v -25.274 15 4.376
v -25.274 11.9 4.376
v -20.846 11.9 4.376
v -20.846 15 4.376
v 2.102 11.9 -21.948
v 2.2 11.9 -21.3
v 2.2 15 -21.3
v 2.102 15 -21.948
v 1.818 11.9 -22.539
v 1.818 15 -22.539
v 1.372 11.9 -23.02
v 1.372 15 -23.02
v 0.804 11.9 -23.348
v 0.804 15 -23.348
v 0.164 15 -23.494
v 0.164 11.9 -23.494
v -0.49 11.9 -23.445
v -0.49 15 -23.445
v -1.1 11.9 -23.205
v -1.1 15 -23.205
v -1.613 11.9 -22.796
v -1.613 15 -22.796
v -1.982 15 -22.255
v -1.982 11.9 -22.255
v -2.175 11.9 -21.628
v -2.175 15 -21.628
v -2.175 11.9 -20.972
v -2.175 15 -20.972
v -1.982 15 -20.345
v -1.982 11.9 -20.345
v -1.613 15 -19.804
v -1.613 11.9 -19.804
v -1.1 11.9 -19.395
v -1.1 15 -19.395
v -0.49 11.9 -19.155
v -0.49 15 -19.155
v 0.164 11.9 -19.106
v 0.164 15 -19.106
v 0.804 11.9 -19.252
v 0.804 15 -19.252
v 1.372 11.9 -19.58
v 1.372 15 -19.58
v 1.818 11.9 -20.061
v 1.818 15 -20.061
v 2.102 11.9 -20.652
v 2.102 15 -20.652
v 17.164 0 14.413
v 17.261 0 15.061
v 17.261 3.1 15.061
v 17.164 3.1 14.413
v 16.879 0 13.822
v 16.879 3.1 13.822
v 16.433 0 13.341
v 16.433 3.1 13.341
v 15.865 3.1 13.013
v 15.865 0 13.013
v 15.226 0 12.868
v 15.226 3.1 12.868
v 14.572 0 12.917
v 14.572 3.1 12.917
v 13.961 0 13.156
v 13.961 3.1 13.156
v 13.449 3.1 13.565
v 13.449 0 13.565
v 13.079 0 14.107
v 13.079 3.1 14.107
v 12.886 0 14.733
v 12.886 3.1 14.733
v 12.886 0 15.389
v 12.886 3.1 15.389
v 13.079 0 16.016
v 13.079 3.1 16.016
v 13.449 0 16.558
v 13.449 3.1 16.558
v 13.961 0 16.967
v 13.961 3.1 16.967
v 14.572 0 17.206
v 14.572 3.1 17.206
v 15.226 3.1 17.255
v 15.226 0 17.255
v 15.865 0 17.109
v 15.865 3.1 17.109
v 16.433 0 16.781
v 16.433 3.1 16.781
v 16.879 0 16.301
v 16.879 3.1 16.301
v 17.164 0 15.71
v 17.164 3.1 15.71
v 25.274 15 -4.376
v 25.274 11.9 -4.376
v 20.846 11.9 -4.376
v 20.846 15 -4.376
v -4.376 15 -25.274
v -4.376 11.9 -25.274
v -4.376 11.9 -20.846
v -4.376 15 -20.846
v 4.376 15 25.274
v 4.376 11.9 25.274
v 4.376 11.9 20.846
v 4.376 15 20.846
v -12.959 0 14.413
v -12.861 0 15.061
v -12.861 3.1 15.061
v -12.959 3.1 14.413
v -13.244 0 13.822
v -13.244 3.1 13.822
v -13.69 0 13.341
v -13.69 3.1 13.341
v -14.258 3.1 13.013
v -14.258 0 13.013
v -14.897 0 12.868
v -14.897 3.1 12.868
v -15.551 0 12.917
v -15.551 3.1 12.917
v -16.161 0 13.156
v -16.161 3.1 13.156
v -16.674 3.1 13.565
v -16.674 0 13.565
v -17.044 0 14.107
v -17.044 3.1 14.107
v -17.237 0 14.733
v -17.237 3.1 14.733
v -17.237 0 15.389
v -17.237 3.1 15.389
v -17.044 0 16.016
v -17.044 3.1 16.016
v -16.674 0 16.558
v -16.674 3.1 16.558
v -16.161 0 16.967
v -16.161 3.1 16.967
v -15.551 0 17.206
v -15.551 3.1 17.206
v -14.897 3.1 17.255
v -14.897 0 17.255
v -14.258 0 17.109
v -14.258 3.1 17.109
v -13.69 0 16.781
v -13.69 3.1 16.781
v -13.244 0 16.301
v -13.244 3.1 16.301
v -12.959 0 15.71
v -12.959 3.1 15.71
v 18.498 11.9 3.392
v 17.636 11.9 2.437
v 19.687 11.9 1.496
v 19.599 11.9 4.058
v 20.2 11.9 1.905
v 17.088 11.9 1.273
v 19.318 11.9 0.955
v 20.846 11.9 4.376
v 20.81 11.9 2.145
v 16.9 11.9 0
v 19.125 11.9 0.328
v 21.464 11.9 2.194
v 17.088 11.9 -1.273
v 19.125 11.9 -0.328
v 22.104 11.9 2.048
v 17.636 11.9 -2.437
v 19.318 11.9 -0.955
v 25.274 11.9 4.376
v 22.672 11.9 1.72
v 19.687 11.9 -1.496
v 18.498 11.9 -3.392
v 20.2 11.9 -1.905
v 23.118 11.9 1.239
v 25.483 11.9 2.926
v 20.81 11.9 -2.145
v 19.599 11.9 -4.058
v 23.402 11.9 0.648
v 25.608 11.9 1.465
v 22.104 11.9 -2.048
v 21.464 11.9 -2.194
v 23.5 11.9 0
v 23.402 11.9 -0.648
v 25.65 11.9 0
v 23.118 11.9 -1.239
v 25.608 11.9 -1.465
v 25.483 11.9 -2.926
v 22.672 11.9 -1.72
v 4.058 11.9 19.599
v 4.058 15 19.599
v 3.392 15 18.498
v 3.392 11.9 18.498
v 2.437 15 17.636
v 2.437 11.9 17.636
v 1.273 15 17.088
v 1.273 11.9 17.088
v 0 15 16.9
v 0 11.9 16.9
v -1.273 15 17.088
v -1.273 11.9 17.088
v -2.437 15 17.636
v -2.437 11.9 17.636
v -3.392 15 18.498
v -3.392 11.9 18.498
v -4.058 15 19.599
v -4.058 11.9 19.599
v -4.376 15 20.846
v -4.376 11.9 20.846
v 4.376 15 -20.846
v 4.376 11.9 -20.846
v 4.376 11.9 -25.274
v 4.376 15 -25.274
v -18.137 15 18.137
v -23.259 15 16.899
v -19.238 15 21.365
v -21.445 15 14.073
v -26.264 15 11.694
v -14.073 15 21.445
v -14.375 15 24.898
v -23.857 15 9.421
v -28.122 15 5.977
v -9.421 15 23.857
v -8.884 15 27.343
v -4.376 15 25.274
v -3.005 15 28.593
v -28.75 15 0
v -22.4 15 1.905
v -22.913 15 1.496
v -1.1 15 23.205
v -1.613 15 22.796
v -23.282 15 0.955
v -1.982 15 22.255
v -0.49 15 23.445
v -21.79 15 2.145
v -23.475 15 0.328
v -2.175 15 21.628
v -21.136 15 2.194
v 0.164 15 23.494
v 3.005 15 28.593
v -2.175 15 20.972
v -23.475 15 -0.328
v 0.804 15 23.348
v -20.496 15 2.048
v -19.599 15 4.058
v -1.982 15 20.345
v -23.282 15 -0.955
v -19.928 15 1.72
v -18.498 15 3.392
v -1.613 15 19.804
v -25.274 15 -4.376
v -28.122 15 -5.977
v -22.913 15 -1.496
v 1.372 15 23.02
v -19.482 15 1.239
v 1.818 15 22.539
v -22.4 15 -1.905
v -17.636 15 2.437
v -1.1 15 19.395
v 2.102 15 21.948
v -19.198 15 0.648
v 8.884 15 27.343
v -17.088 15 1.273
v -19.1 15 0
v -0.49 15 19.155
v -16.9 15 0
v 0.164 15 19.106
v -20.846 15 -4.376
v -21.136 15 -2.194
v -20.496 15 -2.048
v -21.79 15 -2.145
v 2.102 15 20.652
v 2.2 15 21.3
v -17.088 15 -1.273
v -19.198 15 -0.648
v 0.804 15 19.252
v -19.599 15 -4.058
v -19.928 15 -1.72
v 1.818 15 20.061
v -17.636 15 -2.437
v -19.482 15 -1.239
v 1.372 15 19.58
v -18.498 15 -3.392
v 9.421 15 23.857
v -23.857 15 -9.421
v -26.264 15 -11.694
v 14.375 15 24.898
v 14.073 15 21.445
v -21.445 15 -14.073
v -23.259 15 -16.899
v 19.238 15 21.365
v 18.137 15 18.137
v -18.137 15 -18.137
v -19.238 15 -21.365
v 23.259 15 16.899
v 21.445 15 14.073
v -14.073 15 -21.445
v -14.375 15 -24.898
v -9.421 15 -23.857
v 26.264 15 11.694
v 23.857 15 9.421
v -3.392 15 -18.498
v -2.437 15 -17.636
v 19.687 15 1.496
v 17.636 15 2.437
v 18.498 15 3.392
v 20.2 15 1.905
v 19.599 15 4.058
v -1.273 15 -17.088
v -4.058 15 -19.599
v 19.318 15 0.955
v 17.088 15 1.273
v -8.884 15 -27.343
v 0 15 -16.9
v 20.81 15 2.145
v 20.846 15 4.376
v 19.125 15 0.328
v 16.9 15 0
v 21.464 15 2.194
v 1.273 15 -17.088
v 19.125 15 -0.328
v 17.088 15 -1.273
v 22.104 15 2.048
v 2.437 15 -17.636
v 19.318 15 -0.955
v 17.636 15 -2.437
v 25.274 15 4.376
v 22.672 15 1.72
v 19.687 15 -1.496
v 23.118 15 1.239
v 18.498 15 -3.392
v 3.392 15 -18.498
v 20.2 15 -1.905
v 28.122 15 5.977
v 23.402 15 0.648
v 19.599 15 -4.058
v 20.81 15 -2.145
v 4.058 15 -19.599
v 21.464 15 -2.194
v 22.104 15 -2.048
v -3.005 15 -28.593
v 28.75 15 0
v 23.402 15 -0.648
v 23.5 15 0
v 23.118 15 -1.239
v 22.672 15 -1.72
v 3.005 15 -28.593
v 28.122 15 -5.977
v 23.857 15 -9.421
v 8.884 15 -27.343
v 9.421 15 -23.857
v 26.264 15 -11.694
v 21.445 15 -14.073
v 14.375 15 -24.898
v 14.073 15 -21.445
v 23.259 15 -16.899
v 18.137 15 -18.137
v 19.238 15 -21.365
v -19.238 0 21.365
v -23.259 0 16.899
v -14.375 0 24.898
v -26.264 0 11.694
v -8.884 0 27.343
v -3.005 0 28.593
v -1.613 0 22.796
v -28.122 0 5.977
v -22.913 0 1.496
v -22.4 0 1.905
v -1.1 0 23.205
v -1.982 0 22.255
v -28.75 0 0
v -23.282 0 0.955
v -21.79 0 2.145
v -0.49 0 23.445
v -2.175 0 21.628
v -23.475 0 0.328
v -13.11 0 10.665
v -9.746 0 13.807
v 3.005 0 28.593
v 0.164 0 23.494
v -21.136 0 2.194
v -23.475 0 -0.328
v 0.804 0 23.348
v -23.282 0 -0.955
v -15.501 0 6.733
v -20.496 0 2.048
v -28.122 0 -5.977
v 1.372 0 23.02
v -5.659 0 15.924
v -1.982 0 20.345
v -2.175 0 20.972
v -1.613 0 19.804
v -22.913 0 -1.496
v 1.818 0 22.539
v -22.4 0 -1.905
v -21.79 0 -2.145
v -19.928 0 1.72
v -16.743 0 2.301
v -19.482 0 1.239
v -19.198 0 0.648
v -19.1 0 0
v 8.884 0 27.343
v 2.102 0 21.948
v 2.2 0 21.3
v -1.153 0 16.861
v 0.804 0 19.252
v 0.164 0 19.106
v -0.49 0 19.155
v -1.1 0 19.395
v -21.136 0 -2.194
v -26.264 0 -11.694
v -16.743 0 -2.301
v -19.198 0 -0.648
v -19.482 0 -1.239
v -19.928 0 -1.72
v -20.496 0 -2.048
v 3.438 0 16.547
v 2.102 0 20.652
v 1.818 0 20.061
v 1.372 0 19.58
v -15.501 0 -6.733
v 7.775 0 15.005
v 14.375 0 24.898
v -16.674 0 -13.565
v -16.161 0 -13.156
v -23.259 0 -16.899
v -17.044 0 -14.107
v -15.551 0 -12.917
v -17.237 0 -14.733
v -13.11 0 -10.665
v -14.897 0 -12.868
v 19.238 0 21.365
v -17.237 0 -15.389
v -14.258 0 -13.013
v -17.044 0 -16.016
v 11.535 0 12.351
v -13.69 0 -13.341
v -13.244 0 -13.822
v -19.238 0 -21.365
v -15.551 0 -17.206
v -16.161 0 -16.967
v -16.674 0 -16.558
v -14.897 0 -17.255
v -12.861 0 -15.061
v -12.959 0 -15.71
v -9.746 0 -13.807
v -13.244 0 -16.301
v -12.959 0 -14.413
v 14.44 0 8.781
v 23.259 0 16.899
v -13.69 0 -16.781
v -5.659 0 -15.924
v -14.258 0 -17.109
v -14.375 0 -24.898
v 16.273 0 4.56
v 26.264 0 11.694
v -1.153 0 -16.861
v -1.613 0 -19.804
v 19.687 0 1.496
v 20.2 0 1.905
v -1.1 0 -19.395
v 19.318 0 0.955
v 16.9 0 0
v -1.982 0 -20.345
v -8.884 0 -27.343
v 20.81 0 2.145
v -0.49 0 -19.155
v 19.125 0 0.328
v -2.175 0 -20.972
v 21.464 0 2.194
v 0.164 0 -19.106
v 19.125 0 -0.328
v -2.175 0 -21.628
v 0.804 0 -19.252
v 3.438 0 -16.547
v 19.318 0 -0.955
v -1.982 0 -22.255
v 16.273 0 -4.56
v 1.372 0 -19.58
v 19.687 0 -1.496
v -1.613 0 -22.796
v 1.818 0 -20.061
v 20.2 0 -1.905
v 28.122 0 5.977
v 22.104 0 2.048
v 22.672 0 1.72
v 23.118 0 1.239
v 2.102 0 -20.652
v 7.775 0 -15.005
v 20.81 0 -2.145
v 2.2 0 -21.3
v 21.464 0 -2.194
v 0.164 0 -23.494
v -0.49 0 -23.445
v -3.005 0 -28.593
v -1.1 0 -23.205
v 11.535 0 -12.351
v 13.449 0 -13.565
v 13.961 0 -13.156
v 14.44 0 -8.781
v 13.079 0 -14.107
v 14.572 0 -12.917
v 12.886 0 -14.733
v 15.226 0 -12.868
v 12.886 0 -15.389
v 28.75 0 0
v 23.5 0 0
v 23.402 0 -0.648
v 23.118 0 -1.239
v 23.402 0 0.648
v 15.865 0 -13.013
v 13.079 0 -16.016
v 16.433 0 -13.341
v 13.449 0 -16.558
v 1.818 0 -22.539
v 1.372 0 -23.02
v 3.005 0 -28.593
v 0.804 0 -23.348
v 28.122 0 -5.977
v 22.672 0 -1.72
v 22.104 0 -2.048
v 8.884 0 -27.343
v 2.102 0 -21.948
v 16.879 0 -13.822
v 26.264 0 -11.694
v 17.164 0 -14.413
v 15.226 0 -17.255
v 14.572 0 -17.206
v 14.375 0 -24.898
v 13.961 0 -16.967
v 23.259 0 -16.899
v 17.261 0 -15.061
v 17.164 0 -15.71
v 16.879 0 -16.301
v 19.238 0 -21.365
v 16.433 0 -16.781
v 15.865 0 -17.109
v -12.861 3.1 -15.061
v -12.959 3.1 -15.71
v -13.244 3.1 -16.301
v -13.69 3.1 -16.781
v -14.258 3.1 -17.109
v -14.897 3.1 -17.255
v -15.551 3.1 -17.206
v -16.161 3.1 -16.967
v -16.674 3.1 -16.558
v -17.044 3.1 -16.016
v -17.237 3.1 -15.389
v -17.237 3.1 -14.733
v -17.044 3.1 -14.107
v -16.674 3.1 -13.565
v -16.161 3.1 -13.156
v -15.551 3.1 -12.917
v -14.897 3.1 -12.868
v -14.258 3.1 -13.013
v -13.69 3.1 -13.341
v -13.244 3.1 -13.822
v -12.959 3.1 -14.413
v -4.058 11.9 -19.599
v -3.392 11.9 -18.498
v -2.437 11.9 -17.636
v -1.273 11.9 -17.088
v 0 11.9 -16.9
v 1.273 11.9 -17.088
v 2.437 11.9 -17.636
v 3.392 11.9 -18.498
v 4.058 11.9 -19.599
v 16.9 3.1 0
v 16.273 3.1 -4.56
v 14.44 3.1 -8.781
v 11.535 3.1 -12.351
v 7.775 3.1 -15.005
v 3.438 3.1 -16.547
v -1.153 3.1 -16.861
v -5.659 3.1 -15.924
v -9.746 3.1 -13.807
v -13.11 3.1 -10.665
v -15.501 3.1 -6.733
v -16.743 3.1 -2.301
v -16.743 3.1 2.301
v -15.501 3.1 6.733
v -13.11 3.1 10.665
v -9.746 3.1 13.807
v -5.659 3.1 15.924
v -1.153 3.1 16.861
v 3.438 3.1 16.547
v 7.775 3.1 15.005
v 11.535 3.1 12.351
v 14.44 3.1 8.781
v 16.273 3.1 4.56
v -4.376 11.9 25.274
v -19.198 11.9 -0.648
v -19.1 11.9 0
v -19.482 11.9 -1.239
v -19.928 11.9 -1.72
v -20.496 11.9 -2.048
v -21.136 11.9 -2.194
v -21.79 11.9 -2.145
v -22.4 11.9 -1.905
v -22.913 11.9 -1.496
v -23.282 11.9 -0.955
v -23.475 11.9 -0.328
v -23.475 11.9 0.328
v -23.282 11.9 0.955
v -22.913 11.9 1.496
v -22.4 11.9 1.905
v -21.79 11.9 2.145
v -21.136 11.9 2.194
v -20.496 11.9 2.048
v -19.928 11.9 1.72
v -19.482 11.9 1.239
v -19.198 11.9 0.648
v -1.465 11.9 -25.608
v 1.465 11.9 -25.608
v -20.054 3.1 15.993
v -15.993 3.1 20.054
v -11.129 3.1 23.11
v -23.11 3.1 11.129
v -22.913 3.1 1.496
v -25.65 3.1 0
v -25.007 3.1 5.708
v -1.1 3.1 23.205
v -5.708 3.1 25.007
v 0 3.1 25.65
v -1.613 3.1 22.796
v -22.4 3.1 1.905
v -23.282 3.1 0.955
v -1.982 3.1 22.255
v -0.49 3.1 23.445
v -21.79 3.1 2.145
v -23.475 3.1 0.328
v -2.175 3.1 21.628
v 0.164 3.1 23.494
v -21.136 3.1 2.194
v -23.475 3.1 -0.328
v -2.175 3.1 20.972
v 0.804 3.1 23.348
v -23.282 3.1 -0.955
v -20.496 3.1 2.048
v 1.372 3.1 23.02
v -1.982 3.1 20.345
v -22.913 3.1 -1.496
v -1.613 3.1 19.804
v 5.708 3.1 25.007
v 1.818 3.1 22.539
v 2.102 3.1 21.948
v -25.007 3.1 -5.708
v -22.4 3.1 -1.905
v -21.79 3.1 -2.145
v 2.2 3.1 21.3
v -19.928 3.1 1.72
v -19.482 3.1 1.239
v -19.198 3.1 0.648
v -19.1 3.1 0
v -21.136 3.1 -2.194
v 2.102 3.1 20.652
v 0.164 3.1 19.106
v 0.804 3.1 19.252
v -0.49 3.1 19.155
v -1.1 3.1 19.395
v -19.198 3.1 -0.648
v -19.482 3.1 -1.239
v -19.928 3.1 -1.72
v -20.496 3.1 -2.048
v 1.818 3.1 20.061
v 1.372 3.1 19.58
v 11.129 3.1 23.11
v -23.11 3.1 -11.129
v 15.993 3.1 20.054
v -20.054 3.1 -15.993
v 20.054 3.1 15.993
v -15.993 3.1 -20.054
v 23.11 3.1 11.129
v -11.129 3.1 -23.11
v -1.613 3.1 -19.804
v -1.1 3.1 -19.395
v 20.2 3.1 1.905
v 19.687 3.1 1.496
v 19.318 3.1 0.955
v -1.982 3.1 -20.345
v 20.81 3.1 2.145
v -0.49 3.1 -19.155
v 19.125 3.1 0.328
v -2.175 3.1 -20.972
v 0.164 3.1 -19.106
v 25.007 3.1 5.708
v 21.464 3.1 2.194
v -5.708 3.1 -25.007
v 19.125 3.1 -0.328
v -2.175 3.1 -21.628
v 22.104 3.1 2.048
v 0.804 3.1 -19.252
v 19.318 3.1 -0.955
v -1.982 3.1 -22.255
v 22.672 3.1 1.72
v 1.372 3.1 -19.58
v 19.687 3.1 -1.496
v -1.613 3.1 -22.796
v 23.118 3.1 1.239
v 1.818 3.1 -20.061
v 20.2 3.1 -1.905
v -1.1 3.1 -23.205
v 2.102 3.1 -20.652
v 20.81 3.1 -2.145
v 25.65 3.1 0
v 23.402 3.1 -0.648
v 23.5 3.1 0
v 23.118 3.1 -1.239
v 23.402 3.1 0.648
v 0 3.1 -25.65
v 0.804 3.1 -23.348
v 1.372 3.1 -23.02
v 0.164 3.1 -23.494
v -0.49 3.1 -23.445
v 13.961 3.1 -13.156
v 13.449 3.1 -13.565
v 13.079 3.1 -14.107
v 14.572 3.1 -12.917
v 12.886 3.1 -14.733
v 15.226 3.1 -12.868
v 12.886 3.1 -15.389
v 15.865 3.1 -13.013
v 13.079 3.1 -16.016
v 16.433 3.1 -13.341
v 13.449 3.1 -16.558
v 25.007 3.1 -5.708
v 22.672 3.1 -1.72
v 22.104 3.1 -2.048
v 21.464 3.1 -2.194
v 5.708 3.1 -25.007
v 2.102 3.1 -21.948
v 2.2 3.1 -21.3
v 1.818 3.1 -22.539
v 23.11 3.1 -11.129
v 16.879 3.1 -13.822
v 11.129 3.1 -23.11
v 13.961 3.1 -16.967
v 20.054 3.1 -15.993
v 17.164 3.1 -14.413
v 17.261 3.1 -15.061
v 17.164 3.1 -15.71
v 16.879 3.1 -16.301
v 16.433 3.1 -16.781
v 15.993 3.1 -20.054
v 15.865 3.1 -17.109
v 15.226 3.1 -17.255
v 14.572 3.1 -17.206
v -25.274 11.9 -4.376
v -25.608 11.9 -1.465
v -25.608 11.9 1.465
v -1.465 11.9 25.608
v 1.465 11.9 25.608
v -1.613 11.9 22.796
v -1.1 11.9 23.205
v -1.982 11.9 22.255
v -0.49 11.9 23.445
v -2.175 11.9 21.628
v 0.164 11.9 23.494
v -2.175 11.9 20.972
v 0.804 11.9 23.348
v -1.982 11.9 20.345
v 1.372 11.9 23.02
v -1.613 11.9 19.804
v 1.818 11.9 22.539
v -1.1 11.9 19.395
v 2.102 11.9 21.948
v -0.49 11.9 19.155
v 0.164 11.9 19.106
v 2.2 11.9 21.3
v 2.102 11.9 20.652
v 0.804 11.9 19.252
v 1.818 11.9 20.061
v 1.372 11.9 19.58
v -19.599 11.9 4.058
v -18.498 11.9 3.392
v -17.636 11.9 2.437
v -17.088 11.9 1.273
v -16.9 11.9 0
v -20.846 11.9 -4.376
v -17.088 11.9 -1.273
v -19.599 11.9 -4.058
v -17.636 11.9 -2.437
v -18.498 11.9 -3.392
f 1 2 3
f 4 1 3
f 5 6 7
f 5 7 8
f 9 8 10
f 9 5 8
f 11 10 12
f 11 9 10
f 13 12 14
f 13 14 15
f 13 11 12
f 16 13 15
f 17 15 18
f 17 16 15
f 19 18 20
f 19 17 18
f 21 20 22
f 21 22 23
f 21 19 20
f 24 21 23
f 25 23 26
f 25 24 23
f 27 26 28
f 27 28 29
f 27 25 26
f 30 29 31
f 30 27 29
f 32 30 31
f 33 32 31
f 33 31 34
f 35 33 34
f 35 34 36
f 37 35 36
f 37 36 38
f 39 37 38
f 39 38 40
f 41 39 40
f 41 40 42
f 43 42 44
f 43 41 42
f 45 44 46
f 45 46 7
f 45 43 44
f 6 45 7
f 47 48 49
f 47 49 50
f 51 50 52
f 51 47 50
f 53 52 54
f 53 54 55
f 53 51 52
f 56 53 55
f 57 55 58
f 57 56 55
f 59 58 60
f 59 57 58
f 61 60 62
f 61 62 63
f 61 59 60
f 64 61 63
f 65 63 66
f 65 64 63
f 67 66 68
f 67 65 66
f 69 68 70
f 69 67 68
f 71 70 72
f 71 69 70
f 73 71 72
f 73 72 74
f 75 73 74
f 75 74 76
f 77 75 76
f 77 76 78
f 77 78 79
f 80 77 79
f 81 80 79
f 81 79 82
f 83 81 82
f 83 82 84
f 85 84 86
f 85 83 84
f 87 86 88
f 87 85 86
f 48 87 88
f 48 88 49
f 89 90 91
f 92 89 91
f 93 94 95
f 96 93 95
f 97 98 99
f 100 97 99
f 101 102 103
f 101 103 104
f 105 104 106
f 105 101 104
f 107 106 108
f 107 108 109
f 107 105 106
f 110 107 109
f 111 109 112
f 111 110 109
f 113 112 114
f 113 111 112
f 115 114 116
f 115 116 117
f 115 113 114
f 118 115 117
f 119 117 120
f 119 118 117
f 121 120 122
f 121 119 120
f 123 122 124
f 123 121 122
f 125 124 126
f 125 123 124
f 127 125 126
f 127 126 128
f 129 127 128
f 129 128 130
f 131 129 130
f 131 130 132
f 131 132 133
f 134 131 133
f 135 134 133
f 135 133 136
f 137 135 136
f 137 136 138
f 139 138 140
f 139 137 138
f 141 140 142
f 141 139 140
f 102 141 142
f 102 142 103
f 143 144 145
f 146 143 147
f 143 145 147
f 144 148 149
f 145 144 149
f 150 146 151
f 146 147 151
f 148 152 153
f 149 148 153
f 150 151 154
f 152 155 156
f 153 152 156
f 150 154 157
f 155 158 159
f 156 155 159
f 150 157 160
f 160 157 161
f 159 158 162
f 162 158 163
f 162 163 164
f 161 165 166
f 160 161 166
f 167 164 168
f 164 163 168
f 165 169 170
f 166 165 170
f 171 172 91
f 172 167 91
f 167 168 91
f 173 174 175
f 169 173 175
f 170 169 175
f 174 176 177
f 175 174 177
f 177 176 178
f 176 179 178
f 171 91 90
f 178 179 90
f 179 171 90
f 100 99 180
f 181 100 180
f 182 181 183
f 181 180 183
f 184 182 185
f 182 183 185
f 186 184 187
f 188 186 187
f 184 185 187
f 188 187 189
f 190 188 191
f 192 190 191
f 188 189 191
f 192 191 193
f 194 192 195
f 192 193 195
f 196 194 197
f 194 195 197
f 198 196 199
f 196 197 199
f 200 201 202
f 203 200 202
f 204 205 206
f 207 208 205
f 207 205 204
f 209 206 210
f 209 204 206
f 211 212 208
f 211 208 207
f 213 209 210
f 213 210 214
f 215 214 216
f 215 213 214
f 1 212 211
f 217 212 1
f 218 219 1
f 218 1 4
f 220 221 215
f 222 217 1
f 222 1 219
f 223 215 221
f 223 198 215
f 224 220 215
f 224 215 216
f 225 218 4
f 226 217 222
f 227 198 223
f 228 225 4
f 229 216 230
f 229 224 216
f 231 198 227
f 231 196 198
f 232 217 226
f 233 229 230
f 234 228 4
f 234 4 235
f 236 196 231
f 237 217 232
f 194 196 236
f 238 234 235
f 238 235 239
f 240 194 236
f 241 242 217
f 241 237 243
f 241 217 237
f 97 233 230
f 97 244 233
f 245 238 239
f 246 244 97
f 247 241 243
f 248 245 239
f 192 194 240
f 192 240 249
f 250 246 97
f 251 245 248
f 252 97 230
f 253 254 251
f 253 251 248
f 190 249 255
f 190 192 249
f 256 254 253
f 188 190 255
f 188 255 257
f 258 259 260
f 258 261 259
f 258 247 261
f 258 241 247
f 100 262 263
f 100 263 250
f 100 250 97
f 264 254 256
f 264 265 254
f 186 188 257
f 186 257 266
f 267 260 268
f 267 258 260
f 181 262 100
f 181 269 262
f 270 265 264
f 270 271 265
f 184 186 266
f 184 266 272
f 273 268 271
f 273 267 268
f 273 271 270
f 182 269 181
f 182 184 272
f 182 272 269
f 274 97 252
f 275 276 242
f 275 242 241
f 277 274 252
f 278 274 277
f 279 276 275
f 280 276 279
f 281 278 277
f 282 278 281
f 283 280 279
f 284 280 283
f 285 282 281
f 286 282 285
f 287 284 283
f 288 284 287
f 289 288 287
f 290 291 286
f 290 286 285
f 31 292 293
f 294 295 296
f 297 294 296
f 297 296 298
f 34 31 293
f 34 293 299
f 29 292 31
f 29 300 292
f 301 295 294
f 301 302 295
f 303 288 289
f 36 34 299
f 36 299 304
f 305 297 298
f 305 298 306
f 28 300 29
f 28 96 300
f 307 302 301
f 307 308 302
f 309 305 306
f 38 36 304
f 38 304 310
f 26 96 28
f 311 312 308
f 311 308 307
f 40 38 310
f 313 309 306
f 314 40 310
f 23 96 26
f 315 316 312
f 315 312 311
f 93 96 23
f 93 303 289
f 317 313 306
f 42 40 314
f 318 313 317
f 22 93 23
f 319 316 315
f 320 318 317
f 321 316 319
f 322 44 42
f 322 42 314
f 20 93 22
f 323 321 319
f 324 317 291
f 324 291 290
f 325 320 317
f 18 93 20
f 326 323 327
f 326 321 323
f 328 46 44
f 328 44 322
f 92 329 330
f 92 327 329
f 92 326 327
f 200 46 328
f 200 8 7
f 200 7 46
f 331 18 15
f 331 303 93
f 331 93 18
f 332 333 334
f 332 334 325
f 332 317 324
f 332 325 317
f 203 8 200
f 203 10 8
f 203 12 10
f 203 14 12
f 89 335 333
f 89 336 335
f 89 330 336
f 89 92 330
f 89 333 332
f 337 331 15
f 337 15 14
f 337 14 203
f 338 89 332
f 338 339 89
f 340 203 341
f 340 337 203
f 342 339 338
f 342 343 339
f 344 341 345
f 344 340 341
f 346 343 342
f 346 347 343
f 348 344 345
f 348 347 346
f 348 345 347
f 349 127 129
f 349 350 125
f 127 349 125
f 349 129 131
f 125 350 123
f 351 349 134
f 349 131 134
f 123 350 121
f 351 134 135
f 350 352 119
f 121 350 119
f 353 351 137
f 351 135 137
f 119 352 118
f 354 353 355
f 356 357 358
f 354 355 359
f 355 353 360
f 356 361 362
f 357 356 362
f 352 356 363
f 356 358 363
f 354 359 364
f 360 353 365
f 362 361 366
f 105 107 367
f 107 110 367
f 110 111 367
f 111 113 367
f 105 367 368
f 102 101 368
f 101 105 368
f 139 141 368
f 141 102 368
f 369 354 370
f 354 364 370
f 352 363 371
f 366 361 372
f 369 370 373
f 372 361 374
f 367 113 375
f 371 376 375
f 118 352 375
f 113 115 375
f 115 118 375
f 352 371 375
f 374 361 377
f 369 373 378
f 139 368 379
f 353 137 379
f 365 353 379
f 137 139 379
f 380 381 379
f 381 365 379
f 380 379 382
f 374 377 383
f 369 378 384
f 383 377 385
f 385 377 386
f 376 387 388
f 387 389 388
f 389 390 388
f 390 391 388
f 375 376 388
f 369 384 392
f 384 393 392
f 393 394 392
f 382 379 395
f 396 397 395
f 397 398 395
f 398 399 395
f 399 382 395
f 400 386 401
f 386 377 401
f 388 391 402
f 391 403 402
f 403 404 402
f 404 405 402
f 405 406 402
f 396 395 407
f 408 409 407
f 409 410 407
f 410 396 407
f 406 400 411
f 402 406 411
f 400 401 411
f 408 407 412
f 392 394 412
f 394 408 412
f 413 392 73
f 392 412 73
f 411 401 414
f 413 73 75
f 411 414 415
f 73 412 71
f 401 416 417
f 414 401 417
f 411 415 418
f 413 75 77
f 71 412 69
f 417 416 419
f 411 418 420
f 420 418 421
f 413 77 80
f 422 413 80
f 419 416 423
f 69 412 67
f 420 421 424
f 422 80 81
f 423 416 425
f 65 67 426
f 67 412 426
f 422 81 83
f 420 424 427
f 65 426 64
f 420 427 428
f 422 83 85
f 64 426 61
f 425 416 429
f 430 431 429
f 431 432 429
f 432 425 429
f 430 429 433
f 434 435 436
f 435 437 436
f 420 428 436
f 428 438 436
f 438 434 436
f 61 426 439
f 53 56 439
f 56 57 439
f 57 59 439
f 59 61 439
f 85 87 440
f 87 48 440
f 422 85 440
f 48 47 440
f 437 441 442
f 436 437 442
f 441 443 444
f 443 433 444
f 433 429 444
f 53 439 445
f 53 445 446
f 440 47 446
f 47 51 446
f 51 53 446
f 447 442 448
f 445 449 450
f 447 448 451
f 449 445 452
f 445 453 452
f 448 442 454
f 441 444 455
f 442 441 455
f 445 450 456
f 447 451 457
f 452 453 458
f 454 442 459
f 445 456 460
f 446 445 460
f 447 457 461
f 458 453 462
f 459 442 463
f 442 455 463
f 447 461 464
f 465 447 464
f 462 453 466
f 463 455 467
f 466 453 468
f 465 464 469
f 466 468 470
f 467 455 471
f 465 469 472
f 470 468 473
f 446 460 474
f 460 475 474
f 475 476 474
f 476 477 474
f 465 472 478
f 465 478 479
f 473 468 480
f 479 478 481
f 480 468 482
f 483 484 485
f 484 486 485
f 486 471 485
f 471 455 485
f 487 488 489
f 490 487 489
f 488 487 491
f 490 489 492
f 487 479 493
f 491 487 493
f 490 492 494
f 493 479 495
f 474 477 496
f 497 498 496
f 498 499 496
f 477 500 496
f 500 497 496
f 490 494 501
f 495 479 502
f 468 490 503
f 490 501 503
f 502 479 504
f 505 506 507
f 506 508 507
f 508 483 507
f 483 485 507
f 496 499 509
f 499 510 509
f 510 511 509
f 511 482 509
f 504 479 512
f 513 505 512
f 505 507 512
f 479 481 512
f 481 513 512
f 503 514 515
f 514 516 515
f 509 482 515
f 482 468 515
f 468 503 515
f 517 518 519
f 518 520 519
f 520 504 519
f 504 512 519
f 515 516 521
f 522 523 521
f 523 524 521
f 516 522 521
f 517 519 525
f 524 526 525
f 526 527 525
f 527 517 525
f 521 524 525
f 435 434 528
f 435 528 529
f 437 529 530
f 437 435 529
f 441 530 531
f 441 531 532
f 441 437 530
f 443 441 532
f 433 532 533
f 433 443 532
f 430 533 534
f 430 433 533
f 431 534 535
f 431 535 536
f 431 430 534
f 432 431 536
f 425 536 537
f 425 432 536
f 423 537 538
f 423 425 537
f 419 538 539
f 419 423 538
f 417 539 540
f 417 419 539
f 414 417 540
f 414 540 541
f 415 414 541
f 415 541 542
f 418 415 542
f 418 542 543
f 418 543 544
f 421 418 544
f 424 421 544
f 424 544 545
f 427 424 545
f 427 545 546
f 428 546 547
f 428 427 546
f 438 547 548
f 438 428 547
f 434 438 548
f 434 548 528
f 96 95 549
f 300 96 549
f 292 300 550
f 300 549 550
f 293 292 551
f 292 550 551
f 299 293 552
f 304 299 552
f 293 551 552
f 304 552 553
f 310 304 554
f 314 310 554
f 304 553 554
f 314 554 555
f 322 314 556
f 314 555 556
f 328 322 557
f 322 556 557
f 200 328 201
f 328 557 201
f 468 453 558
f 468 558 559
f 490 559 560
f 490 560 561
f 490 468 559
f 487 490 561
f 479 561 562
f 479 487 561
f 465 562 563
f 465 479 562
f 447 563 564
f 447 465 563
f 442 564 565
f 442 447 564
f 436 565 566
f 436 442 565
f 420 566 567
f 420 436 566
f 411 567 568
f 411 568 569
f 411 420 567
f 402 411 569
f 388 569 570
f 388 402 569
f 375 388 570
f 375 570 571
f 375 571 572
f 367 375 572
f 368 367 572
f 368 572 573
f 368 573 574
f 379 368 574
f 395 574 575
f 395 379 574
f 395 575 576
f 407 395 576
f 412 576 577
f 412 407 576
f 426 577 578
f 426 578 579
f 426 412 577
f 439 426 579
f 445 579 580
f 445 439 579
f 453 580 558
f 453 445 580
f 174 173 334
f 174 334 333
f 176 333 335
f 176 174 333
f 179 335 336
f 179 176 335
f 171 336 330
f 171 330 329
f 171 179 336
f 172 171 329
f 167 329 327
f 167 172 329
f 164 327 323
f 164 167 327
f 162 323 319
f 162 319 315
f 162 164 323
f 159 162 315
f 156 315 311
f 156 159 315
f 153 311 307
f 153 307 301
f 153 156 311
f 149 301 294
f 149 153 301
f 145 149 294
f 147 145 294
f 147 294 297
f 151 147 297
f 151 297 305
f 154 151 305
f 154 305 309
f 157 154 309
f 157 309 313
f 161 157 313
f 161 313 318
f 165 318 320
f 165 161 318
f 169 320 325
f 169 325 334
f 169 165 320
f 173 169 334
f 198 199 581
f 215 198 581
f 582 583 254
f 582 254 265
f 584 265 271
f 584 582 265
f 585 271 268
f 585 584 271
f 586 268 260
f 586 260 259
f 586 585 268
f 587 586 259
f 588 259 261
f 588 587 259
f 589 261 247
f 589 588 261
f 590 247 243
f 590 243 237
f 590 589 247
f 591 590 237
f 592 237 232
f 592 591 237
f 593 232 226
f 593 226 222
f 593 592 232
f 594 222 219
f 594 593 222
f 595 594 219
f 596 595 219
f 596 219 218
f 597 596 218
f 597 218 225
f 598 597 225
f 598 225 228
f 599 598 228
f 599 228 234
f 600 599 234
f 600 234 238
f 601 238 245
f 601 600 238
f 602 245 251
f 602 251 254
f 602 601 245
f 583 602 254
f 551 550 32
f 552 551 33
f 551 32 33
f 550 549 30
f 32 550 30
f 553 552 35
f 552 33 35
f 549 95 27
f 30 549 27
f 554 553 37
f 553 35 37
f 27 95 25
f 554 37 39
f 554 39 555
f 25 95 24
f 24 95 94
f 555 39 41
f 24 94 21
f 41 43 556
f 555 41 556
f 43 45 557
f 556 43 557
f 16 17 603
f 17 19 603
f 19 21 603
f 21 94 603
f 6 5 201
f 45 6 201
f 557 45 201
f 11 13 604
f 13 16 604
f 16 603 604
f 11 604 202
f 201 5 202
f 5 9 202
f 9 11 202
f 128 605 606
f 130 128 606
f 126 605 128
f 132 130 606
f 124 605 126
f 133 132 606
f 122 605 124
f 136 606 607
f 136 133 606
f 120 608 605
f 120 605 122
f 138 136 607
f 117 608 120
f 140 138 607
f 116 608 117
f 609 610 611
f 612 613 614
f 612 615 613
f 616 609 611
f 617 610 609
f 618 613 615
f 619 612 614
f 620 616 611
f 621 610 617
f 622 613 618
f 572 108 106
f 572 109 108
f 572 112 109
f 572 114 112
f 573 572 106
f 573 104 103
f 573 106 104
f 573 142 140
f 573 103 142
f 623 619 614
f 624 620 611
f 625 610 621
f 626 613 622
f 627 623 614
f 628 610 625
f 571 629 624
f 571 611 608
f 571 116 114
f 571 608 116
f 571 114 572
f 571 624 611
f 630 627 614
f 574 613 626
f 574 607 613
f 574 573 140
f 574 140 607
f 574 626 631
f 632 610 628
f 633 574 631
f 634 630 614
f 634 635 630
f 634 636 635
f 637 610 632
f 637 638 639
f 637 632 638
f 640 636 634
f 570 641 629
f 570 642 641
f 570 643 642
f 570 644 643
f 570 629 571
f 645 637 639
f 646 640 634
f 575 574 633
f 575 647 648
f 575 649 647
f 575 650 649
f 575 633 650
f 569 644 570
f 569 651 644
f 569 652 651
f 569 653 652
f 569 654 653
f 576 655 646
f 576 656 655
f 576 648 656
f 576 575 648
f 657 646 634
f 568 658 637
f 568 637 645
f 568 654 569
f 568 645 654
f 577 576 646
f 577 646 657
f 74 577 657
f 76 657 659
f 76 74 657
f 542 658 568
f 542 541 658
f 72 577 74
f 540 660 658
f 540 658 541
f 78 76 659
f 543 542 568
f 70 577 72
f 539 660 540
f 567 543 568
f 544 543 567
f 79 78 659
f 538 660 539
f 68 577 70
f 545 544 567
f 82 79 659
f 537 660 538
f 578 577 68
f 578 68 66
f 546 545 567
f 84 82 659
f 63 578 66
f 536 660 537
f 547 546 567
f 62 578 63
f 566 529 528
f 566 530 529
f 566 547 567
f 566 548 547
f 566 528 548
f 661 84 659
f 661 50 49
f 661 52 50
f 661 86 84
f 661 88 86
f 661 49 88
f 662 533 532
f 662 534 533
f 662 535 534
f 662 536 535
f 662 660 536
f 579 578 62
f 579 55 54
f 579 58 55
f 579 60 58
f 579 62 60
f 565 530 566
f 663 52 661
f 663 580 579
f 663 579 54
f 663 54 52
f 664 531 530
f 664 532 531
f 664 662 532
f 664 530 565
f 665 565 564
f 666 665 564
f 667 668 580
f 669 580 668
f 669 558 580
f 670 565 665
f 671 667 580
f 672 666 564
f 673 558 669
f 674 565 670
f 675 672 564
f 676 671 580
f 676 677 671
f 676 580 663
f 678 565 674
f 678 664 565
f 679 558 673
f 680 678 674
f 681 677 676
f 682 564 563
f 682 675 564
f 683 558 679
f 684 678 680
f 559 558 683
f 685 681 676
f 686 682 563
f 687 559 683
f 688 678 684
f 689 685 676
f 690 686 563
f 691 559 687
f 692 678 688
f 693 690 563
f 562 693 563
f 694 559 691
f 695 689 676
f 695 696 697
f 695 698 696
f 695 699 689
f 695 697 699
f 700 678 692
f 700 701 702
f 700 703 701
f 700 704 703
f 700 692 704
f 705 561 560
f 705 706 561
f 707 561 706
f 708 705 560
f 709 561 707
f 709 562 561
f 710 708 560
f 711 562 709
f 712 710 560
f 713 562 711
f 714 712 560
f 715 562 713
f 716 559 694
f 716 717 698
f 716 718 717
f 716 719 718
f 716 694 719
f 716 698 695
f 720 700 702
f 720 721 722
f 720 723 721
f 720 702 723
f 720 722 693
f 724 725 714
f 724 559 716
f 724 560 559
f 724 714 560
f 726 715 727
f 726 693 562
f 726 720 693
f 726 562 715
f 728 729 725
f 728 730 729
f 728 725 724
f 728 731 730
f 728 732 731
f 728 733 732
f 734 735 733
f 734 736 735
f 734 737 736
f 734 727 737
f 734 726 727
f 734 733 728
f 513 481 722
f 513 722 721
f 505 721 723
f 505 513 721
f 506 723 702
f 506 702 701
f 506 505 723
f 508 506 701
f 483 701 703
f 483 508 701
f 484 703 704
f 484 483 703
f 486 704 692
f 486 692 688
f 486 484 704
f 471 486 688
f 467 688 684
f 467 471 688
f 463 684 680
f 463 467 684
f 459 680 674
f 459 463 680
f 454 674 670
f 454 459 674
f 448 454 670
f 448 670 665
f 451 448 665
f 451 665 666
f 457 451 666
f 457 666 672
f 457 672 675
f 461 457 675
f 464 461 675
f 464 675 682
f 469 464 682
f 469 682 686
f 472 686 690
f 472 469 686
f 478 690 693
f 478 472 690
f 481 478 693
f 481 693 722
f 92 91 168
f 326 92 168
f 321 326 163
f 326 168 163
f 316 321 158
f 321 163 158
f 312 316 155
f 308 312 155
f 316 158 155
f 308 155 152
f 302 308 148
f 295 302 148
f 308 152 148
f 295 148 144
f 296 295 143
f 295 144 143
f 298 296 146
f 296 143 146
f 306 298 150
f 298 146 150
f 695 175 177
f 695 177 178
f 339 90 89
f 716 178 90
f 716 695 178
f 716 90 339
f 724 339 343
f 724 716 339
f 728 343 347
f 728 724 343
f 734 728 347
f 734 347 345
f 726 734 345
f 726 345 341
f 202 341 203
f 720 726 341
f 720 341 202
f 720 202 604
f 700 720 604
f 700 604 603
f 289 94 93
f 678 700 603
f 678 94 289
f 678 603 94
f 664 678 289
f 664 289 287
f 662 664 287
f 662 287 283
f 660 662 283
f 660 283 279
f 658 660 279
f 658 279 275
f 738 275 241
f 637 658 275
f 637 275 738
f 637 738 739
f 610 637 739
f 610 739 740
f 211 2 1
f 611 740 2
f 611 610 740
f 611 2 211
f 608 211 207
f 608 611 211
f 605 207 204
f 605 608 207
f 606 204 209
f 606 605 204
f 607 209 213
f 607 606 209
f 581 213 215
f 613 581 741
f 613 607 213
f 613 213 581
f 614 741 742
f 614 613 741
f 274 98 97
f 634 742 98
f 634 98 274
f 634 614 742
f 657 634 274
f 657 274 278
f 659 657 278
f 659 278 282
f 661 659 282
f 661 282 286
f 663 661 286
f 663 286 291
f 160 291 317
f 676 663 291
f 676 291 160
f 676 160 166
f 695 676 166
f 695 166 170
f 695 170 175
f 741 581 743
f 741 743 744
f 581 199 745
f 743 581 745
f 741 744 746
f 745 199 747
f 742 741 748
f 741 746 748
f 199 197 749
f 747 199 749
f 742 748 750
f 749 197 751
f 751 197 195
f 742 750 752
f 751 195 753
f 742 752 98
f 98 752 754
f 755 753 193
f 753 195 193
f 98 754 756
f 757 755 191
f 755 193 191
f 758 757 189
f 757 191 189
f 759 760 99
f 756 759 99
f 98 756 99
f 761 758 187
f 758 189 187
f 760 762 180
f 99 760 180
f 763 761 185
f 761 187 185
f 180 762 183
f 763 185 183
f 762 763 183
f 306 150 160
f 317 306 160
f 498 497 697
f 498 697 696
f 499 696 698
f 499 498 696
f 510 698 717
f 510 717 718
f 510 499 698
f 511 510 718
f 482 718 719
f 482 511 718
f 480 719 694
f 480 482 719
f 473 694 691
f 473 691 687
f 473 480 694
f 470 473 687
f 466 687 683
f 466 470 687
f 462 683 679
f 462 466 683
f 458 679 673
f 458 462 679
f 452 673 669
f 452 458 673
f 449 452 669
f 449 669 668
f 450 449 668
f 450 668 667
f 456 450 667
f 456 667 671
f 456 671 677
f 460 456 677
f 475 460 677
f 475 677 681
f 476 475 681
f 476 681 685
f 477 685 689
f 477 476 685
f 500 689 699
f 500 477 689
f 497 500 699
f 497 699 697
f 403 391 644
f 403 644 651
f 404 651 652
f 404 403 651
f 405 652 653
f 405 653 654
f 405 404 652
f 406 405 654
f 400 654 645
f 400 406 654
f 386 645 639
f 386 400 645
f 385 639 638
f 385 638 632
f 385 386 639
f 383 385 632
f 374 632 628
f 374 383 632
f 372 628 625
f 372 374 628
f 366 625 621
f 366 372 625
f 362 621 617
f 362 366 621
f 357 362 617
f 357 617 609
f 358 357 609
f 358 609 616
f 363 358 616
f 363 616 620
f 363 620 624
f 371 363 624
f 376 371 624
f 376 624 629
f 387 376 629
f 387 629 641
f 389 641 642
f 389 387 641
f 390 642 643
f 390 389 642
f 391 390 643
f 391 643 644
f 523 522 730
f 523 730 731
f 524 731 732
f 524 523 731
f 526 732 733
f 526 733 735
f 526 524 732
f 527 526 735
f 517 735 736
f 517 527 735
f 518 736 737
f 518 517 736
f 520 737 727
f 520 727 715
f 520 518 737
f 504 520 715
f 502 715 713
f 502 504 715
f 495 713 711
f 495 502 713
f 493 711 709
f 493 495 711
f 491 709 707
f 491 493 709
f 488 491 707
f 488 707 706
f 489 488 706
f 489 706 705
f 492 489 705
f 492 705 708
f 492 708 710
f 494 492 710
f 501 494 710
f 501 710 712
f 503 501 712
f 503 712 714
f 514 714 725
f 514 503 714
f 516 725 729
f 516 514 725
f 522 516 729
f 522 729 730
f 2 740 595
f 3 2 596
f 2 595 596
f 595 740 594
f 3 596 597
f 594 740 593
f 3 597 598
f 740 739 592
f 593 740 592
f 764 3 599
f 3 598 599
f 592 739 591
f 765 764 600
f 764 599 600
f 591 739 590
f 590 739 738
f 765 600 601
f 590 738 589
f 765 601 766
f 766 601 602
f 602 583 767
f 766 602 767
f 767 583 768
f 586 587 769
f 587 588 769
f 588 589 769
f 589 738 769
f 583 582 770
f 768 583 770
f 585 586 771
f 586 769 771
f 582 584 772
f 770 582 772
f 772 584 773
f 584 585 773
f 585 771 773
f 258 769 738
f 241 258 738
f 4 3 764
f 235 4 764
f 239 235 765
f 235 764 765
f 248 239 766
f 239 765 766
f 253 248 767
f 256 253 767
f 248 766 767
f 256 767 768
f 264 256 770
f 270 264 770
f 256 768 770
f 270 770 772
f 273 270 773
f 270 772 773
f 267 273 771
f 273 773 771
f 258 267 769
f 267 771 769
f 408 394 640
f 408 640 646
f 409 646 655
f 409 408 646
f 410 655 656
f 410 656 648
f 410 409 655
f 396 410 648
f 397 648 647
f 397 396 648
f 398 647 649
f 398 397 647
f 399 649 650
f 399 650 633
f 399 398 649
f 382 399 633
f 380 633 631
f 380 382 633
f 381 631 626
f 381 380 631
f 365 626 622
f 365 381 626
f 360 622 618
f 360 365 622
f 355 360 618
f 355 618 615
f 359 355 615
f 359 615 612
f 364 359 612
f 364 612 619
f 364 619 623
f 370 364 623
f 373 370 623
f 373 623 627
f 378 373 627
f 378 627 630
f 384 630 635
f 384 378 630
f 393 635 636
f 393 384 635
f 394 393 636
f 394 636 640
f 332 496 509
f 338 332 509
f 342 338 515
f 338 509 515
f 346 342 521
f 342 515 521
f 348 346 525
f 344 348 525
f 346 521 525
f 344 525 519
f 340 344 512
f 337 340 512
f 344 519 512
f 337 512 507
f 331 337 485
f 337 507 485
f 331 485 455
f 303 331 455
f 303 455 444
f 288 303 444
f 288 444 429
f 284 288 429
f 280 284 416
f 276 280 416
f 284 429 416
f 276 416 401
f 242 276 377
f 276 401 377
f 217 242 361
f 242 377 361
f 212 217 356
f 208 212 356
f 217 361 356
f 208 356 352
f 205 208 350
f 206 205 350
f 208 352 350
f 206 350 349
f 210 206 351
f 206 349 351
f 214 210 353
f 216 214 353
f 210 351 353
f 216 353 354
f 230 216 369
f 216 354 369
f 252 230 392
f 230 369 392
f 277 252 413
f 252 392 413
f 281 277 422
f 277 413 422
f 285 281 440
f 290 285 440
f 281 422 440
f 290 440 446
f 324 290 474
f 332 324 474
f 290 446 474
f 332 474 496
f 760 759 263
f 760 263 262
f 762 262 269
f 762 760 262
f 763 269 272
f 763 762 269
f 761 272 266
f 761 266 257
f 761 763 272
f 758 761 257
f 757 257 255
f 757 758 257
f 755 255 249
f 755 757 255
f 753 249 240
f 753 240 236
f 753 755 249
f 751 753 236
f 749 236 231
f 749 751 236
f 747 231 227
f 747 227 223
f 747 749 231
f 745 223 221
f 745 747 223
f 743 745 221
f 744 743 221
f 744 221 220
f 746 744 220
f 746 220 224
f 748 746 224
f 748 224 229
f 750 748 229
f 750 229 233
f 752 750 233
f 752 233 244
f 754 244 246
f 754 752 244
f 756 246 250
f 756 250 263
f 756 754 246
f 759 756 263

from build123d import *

# Parameters (mm, degrees)
SKETCH1_R           = 25.65
SKETCH1_R_2         = 16.9
SKETCH1_R_3         = 2.2
BOSS_EXTRUDE1_DEPTH = 3.1
SKETCH1_3_R         = 28.75
SKETCH1_3_R_2       = 25.65
BOSS_EXTRUDE2_DEPTH = 15
SKETCH2_R           = 2.2
BOSS_EXTRUDE4_DEPTH = 3.1


with BuildPart() as part:
    # Sketch1 → Boss-Extrude1 (new body)
    with BuildSketch(Plane(origin=(0, 0, 0), x_dir=(1, 0, 0), z_dir=(0, 1, 0))):
        Circle(SKETCH1_R)
        Circle(SKETCH1_R_2, mode=Mode.SUBTRACT)
        with Locations((0, 21.3)):
            Circle(SKETCH1_R_3, mode=Mode.SUBTRACT)
        with Locations((15.061374439, 15.061374439)):
            Circle(SKETCH1_R_3, mode=Mode.SUBTRACT)
        with Locations((21.3, 0)):
            Circle(SKETCH1_R_3, mode=Mode.SUBTRACT)
        with Locations((15.061374439, -15.061374439)):
            Circle(SKETCH1_R_3, mode=Mode.SUBTRACT)
        with Locations((0, -21.3)):
            Circle(SKETCH1_R_3, mode=Mode.SUBTRACT)
        with Locations((-15.061374439, -15.061374439)):
            Circle(SKETCH1_R_3, mode=Mode.SUBTRACT)
        with Locations((-21.3, 0)):
            Circle(SKETCH1_R_3, mode=Mode.SUBTRACT)
        with Locations((-15.061374439, 15.061374439)):
            Circle(SKETCH1_R_3, mode=Mode.SUBTRACT)
    extrude(amount=BOSS_EXTRUDE1_DEPTH)

    # Sketch1<3> → Boss-Extrude2 (add)
    with BuildSketch(Plane(origin=(0, 0, 0), x_dir=(1, 0, 0), z_dir=(0, 1, 0))):
        Circle(SKETCH1_3_R)
        Circle(SKETCH1_3_R_2, mode=Mode.SUBTRACT)
    extrude(amount=BOSS_EXTRUDE2_DEPTH)

    # Sketch2 → Boss-Extrude4 (add)
    # profile 1 of 4: a face of its own
    with BuildSketch(Plane(origin=(0, 11.9, 0), x_dir=(1, 0, 0), z_dir=(0, 1, 0))):
        with BuildLine():
            ThreePointArc((-20.845539906, -4.376467299), (-16.9, 0), (-20.845539906, 4.376467299))
            Line((-20.845539906, 4.376467299), (-25.273880469, 4.376467299))
            ThreePointArc((-25.273880469, 4.376467299), (-25.65, 0), (-25.273880469, -4.376467299))
            Line((-25.273880469, -4.376467299), (-20.845539906, -4.376467299))
        make_face()
        with Locations((-21.3, 0)):
            Circle(SKETCH2_R, mode=Mode.SUBTRACT)
    # profile 2 of 4: a face of its own
    with BuildSketch(Plane(origin=(0, 11.9, 0), x_dir=(1, 0, 0), z_dir=(0, 1, 0))):
        with BuildLine():
            ThreePointArc((4.376467299, 25.273880469), (0, 25.65), (-4.376467299, 25.273880469))
            Line((-4.376467299, 25.273880469), (-4.376467299, 20.845539906))
            ThreePointArc((-4.376467299, 20.845539906), (0, 16.9), (4.376467299, 20.845539906))
            Line((4.376467299, 20.845539906), (4.376467299, 25.273880469))
        make_face()
        with Locations((0, 21.3)):
            Circle(SKETCH2_R, mode=Mode.SUBTRACT)
    # profile 3 of 4: a face of its own
    with BuildSketch(Plane(origin=(0, 11.9, 0), x_dir=(1, 0, 0), z_dir=(0, 1, 0))):
        with BuildLine():
            Line((-4.376467299, -20.845539906), (-4.376467299, -25.273880469))
            ThreePointArc((-4.376467299, -25.273880469), (0, -25.65), (4.376467299, -25.273880469))
            Line((4.376467299, -25.273880469), (4.376467299, -20.845539906))
            ThreePointArc((4.376467299, -20.845539906), (0, -16.9), (-4.376467299, -20.845539906))
        make_face()
        with Locations((0, -21.3)):
            Circle(SKETCH2_R, mode=Mode.SUBTRACT)
    # profile 4 of 4: a face of its own
    with BuildSketch(Plane(origin=(0, 11.9, 0), x_dir=(1, 0, 0), z_dir=(0, 1, 0))):
        with BuildLine():
            ThreePointArc((25.273880469, -4.376467299), (25.65, 0), (25.273880469, 4.376467299))
            Line((25.273880469, 4.376467299), (20.845539906, 4.376467299))
            ThreePointArc((20.845539906, 4.376467299), (16.9, 0), (20.845539906, -4.376467299))
            Line((20.845539906, -4.376467299), (25.273880469, -4.376467299))
        make_face()
        with Locations((21.3, 0)):
            Circle(SKETCH2_R, mode=Mode.SUBTRACT)
    extrude(amount=BOSS_EXTRUDE4_DEPTH)


solid = part.part
